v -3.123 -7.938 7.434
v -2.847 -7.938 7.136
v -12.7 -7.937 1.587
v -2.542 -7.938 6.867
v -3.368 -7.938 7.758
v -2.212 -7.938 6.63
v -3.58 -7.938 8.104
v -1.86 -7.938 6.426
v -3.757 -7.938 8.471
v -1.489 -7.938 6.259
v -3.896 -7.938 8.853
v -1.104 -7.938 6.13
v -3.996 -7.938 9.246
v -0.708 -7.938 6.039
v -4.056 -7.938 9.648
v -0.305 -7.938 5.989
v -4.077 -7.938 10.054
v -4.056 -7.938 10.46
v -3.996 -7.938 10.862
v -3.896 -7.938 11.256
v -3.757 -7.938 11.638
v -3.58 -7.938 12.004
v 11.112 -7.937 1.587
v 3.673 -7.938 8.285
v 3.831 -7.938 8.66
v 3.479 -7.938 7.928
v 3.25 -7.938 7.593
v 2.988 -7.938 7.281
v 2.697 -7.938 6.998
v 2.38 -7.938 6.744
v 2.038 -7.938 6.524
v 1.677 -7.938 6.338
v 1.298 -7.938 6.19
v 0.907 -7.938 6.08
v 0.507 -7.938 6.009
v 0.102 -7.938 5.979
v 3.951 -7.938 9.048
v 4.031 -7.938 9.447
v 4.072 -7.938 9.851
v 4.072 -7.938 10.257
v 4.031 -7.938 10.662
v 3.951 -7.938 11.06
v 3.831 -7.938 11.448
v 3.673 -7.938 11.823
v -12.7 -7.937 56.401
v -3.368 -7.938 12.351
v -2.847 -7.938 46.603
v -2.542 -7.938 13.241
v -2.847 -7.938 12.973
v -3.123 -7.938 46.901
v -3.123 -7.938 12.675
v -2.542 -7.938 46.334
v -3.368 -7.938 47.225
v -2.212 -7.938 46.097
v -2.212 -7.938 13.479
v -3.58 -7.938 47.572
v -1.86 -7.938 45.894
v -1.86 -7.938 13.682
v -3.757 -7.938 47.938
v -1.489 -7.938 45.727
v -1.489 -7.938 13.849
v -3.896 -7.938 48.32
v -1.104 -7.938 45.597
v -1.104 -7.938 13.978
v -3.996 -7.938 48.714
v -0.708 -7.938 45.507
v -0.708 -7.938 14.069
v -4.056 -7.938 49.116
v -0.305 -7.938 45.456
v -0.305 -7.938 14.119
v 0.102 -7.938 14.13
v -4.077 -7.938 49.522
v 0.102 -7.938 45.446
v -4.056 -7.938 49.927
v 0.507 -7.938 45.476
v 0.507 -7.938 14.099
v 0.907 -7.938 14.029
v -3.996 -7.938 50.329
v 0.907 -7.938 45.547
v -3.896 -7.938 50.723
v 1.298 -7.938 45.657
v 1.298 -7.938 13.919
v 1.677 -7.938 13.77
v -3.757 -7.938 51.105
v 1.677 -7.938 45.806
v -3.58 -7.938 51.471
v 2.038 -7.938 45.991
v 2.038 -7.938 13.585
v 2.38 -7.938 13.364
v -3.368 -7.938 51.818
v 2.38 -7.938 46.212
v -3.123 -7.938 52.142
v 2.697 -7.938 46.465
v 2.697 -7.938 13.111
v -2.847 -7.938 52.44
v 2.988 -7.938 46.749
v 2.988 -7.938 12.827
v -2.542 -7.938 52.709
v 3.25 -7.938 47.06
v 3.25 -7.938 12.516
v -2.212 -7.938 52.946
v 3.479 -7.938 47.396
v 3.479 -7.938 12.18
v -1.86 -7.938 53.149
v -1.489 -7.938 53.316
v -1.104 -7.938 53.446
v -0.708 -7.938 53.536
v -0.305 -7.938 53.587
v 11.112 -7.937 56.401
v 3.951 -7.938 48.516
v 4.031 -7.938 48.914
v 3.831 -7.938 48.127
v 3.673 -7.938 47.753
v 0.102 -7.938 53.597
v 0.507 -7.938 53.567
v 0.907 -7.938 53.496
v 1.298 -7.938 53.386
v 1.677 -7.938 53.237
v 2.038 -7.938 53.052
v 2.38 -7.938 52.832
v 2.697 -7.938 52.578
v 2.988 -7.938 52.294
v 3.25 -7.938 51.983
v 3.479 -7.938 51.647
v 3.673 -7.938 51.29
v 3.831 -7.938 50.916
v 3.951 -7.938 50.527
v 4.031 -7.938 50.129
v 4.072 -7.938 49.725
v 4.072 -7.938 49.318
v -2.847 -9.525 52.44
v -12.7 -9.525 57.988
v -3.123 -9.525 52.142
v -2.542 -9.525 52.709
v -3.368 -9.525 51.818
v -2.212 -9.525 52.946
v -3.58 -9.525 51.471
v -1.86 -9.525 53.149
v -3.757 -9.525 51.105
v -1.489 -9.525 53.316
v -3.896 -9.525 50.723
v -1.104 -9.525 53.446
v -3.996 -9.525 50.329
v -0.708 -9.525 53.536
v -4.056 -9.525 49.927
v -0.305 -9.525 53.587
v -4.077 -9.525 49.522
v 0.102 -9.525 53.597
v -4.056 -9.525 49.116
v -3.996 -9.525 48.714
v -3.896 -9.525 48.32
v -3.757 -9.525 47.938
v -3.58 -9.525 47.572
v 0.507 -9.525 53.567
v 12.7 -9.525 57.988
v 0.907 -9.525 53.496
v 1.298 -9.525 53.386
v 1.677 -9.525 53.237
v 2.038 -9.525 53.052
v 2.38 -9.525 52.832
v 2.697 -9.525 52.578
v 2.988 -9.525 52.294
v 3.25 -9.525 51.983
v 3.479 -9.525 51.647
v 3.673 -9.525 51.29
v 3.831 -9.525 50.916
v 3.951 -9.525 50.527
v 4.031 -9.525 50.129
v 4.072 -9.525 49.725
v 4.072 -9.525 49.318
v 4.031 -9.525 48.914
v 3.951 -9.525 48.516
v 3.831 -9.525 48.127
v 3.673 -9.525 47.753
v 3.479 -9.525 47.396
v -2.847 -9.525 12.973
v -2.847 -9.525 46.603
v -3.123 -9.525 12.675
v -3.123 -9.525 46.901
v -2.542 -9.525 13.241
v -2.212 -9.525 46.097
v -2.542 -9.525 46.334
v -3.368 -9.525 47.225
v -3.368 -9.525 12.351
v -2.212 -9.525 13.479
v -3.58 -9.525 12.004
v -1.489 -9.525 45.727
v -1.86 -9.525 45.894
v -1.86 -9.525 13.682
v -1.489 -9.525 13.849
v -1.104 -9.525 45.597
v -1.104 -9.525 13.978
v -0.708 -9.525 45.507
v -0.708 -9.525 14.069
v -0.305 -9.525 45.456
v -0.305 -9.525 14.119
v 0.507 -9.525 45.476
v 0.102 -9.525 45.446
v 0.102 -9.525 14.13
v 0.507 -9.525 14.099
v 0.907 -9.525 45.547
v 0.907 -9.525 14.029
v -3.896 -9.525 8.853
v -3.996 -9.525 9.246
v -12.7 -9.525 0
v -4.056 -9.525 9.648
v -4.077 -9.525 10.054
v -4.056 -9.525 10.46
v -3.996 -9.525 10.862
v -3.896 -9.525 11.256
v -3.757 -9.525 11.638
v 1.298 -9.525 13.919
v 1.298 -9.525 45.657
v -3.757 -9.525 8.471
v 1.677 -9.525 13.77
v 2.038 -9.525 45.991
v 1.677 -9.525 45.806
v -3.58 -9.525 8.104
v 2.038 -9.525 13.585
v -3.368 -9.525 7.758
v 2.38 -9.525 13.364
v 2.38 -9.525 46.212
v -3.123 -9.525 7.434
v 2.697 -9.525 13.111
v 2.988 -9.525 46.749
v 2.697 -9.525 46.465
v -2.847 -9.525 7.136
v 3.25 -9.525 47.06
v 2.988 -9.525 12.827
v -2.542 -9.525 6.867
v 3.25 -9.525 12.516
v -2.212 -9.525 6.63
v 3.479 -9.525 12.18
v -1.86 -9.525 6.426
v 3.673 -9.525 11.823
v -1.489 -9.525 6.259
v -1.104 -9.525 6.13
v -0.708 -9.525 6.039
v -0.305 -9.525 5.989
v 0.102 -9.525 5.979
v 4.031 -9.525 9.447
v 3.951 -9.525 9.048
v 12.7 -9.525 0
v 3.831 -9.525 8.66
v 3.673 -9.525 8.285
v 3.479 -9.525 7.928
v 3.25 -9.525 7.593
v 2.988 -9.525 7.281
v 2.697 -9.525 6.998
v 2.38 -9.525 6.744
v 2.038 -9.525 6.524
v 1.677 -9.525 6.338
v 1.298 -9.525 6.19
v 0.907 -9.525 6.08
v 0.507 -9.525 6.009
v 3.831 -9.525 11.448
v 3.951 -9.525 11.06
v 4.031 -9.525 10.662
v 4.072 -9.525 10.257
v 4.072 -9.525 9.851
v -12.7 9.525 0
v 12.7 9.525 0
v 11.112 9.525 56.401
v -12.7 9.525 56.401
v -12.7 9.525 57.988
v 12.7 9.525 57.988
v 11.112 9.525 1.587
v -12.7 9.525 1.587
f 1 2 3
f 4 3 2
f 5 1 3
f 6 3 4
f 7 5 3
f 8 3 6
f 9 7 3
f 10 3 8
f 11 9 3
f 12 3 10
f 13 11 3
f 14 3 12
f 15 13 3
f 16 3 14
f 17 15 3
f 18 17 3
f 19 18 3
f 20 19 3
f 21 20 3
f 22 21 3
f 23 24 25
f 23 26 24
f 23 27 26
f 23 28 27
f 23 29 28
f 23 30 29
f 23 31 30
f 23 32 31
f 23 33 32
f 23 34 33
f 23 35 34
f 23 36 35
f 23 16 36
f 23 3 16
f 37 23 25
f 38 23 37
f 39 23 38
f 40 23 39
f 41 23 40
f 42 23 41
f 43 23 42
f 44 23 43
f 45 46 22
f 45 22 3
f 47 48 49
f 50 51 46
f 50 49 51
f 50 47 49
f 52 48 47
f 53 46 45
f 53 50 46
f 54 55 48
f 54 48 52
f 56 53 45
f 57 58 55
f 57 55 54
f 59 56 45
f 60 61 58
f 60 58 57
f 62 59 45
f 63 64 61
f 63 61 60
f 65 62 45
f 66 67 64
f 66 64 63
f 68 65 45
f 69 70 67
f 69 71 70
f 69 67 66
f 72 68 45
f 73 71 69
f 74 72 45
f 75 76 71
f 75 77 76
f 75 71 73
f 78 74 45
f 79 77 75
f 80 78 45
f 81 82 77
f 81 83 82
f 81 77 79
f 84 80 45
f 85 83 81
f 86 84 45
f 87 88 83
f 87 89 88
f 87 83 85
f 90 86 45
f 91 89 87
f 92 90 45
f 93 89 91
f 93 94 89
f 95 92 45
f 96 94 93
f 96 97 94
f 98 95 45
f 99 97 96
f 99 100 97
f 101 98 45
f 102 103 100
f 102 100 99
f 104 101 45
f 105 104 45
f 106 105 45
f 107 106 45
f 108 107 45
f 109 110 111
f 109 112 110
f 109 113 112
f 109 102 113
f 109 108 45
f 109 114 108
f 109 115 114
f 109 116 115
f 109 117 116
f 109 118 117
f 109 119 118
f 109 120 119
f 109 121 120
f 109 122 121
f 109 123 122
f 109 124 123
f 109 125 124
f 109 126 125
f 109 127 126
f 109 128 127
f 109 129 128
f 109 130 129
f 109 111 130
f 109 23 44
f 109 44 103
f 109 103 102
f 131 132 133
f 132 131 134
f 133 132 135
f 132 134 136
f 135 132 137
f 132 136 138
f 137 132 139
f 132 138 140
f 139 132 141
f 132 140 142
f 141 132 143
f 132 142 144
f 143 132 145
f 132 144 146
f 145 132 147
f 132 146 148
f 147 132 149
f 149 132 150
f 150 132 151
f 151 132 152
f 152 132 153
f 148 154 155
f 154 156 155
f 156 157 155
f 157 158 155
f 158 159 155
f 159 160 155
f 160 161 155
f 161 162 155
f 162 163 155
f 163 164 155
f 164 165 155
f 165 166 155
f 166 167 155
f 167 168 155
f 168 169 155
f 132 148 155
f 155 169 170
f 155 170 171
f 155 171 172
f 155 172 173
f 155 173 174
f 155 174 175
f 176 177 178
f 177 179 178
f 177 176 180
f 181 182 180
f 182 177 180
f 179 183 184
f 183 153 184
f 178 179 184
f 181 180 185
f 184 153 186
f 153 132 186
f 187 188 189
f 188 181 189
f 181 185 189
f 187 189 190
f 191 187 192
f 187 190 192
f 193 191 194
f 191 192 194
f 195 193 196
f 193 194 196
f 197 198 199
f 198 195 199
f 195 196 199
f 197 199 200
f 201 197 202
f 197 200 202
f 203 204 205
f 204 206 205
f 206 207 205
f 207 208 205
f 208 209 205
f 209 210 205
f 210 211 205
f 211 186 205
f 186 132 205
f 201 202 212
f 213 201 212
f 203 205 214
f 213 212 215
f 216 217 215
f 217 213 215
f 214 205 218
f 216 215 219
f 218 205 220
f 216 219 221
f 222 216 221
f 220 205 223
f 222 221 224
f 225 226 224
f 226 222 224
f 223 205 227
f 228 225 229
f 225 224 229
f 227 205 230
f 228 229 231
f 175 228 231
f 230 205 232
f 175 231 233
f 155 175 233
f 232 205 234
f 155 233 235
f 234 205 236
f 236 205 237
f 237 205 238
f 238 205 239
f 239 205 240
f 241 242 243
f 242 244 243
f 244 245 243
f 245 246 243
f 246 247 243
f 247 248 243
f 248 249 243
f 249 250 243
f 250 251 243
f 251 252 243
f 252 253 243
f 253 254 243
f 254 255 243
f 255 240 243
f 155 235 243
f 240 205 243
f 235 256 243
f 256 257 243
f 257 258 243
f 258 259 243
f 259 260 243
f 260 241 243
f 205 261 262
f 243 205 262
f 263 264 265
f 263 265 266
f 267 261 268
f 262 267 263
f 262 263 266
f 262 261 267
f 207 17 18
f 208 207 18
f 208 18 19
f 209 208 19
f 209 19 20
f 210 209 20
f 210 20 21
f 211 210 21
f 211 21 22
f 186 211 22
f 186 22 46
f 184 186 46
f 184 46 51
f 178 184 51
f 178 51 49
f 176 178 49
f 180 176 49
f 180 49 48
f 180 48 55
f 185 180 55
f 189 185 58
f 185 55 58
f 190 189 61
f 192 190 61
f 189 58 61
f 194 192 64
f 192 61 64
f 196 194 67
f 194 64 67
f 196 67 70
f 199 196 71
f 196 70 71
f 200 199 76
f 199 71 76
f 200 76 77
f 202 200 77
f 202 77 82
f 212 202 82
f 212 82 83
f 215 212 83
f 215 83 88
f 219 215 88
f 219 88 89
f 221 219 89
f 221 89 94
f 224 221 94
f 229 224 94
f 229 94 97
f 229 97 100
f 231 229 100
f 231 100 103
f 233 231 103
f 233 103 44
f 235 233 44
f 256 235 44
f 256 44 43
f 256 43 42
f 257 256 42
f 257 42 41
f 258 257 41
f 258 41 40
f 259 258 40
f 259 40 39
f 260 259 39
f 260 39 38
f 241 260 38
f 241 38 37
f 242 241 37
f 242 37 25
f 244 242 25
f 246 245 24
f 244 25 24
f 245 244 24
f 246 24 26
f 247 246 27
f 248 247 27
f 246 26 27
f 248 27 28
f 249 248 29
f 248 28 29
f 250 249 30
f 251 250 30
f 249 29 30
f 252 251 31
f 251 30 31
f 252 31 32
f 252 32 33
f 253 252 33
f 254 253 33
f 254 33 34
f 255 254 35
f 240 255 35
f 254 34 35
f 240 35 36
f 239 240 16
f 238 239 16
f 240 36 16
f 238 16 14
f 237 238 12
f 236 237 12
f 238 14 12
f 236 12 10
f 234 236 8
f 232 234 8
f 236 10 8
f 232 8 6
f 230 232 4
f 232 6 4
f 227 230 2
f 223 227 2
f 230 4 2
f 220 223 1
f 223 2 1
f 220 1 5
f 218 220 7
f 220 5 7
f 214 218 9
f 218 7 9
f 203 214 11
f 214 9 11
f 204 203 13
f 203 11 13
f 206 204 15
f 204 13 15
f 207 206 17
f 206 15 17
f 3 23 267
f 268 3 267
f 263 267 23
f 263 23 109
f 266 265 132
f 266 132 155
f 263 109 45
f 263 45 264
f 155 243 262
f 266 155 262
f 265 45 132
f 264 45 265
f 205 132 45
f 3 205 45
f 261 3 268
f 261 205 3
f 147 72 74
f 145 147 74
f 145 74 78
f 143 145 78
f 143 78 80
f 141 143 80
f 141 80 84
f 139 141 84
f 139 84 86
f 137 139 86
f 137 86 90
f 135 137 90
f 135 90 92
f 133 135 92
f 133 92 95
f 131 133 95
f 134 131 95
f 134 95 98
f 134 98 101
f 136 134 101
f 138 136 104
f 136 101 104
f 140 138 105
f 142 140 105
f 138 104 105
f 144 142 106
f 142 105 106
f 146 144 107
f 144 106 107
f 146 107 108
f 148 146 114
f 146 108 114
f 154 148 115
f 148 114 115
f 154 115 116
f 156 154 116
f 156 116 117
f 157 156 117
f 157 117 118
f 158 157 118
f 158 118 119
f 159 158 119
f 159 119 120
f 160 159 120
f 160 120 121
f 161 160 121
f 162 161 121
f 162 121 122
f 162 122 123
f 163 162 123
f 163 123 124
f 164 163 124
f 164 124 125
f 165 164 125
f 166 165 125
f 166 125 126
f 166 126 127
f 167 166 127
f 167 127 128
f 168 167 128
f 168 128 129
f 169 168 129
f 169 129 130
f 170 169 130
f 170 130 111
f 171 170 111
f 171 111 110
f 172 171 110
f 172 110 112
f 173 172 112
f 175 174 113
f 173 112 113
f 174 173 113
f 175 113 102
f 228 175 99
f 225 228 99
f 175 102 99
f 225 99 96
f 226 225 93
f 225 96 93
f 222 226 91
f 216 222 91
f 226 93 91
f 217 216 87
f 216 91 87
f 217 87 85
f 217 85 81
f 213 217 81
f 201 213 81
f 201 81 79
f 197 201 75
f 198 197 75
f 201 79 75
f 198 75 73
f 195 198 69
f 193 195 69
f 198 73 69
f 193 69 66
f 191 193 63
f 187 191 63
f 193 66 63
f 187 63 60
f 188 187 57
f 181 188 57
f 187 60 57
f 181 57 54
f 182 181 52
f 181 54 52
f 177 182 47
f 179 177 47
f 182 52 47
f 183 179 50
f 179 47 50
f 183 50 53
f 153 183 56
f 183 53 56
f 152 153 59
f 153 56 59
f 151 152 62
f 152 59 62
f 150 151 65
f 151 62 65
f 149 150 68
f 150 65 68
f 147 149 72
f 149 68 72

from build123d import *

# Parameters (mm, degrees)
SKETCH1_W               = 25.4
SKETCH1_H               = 19.05
BOSS_EXTRUDE2_DEPTH     = 57.9882
CUT_EXTRUDE3_DEPTH      = 65.019660763
CUT_EXTRUDE3_DEPTH_BACK = 23.8125
SKETCH4_W               = 54.8132
SKETCH4_H               = 17.4625
SKETCH5_R               = 4.0767
CUT_EXTRUDE4_DEPTH      = 23.8125


with BuildPart() as part:
    # Sketch1 → Boss-Extrude2 (new body)
    with BuildSketch(Plane.XY):
        Rectangle(SKETCH1_W, SKETCH1_H)
    extrude(amount=BOSS_EXTRUDE2_DEPTH)

    # Sketch4 → Cut-Extrude3 (cut, two sides: drawn at the far end of the back side and taken through both)
    with BuildSketch(Plane.ZY.offset(12.7).offset(-CUT_EXTRUDE3_DEPTH_BACK)):
        with Locations((28.9941, 0.79375)):
            Rectangle(SKETCH4_W, SKETCH4_H)
    extrude(amount=CUT_EXTRUDE3_DEPTH + CUT_EXTRUDE3_DEPTH_BACK, mode=Mode.SUBTRACT)

    # Sketch5 → Cut-Extrude4 (cut)
    with BuildSketch(Plane(origin=(0, -7.9375, 0), x_dir=(1, 0, 0), z_dir=(0, 1, 0))):
        with Locations(Location((0, -10.054166667, 0), (0, 0, 180))):
            Circle(SKETCH5_R)
        with Locations(Location((0, -49.521533333, 0), (0, 0, 180))):
            Circle(SKETCH5_R)
    extrude(amount=-CUT_EXTRUDE4_DEPTH, mode=Mode.SUBTRACT)


solid = part.part
